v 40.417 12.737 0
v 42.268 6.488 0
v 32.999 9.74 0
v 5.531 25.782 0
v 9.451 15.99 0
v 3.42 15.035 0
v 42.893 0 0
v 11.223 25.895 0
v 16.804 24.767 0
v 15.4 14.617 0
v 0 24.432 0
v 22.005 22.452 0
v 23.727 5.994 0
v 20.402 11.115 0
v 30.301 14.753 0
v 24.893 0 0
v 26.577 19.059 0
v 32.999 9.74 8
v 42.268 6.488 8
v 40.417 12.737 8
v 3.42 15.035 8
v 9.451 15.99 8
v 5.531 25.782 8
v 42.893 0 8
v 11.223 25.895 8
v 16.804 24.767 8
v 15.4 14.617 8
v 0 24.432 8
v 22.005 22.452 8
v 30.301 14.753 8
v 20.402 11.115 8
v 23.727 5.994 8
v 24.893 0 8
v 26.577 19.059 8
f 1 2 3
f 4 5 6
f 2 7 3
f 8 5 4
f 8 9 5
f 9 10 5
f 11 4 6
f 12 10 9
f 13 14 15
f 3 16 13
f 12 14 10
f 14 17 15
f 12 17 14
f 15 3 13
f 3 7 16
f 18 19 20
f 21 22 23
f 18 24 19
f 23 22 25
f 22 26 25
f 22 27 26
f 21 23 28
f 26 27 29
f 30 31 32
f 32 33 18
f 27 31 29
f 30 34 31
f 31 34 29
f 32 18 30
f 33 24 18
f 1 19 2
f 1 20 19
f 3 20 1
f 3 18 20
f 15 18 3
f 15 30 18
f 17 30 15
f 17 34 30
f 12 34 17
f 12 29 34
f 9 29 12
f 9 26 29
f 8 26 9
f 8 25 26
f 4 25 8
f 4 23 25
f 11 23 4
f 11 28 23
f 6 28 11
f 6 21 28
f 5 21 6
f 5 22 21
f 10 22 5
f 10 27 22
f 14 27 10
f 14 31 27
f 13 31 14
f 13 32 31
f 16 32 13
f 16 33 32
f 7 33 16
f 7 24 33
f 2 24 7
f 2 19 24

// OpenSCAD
$fn = 32;

// ----------------------------------------------------------------------
// Arc stop: segment, 8 mm thick
// ----------------------------------------------------------------------

// --- parameters (mm) ---
profile_height = 8;       // extrusion height
profile_points = 17;      // points of the closed outline

profile = [[42.893, 0], [42.268, 6.488], [40.417, 12.737], [32.999, 9.74], [30.301, 14.753], [26.577, 19.059], [22.005, 22.452], [16.804, 24.767], [11.223, 25.895], [5.531, 25.782], [0, 24.432], [3.42, 15.035], [9.451, 15.99], [15.4, 14.617], [20.402, 11.115], [23.727, 5.994], [24.893, 0]];  // single closed polygon, 17 points, counter clockwise

// --- the one profile operation ---
linear_extrude(height = profile_height) polygon(points = profile);
